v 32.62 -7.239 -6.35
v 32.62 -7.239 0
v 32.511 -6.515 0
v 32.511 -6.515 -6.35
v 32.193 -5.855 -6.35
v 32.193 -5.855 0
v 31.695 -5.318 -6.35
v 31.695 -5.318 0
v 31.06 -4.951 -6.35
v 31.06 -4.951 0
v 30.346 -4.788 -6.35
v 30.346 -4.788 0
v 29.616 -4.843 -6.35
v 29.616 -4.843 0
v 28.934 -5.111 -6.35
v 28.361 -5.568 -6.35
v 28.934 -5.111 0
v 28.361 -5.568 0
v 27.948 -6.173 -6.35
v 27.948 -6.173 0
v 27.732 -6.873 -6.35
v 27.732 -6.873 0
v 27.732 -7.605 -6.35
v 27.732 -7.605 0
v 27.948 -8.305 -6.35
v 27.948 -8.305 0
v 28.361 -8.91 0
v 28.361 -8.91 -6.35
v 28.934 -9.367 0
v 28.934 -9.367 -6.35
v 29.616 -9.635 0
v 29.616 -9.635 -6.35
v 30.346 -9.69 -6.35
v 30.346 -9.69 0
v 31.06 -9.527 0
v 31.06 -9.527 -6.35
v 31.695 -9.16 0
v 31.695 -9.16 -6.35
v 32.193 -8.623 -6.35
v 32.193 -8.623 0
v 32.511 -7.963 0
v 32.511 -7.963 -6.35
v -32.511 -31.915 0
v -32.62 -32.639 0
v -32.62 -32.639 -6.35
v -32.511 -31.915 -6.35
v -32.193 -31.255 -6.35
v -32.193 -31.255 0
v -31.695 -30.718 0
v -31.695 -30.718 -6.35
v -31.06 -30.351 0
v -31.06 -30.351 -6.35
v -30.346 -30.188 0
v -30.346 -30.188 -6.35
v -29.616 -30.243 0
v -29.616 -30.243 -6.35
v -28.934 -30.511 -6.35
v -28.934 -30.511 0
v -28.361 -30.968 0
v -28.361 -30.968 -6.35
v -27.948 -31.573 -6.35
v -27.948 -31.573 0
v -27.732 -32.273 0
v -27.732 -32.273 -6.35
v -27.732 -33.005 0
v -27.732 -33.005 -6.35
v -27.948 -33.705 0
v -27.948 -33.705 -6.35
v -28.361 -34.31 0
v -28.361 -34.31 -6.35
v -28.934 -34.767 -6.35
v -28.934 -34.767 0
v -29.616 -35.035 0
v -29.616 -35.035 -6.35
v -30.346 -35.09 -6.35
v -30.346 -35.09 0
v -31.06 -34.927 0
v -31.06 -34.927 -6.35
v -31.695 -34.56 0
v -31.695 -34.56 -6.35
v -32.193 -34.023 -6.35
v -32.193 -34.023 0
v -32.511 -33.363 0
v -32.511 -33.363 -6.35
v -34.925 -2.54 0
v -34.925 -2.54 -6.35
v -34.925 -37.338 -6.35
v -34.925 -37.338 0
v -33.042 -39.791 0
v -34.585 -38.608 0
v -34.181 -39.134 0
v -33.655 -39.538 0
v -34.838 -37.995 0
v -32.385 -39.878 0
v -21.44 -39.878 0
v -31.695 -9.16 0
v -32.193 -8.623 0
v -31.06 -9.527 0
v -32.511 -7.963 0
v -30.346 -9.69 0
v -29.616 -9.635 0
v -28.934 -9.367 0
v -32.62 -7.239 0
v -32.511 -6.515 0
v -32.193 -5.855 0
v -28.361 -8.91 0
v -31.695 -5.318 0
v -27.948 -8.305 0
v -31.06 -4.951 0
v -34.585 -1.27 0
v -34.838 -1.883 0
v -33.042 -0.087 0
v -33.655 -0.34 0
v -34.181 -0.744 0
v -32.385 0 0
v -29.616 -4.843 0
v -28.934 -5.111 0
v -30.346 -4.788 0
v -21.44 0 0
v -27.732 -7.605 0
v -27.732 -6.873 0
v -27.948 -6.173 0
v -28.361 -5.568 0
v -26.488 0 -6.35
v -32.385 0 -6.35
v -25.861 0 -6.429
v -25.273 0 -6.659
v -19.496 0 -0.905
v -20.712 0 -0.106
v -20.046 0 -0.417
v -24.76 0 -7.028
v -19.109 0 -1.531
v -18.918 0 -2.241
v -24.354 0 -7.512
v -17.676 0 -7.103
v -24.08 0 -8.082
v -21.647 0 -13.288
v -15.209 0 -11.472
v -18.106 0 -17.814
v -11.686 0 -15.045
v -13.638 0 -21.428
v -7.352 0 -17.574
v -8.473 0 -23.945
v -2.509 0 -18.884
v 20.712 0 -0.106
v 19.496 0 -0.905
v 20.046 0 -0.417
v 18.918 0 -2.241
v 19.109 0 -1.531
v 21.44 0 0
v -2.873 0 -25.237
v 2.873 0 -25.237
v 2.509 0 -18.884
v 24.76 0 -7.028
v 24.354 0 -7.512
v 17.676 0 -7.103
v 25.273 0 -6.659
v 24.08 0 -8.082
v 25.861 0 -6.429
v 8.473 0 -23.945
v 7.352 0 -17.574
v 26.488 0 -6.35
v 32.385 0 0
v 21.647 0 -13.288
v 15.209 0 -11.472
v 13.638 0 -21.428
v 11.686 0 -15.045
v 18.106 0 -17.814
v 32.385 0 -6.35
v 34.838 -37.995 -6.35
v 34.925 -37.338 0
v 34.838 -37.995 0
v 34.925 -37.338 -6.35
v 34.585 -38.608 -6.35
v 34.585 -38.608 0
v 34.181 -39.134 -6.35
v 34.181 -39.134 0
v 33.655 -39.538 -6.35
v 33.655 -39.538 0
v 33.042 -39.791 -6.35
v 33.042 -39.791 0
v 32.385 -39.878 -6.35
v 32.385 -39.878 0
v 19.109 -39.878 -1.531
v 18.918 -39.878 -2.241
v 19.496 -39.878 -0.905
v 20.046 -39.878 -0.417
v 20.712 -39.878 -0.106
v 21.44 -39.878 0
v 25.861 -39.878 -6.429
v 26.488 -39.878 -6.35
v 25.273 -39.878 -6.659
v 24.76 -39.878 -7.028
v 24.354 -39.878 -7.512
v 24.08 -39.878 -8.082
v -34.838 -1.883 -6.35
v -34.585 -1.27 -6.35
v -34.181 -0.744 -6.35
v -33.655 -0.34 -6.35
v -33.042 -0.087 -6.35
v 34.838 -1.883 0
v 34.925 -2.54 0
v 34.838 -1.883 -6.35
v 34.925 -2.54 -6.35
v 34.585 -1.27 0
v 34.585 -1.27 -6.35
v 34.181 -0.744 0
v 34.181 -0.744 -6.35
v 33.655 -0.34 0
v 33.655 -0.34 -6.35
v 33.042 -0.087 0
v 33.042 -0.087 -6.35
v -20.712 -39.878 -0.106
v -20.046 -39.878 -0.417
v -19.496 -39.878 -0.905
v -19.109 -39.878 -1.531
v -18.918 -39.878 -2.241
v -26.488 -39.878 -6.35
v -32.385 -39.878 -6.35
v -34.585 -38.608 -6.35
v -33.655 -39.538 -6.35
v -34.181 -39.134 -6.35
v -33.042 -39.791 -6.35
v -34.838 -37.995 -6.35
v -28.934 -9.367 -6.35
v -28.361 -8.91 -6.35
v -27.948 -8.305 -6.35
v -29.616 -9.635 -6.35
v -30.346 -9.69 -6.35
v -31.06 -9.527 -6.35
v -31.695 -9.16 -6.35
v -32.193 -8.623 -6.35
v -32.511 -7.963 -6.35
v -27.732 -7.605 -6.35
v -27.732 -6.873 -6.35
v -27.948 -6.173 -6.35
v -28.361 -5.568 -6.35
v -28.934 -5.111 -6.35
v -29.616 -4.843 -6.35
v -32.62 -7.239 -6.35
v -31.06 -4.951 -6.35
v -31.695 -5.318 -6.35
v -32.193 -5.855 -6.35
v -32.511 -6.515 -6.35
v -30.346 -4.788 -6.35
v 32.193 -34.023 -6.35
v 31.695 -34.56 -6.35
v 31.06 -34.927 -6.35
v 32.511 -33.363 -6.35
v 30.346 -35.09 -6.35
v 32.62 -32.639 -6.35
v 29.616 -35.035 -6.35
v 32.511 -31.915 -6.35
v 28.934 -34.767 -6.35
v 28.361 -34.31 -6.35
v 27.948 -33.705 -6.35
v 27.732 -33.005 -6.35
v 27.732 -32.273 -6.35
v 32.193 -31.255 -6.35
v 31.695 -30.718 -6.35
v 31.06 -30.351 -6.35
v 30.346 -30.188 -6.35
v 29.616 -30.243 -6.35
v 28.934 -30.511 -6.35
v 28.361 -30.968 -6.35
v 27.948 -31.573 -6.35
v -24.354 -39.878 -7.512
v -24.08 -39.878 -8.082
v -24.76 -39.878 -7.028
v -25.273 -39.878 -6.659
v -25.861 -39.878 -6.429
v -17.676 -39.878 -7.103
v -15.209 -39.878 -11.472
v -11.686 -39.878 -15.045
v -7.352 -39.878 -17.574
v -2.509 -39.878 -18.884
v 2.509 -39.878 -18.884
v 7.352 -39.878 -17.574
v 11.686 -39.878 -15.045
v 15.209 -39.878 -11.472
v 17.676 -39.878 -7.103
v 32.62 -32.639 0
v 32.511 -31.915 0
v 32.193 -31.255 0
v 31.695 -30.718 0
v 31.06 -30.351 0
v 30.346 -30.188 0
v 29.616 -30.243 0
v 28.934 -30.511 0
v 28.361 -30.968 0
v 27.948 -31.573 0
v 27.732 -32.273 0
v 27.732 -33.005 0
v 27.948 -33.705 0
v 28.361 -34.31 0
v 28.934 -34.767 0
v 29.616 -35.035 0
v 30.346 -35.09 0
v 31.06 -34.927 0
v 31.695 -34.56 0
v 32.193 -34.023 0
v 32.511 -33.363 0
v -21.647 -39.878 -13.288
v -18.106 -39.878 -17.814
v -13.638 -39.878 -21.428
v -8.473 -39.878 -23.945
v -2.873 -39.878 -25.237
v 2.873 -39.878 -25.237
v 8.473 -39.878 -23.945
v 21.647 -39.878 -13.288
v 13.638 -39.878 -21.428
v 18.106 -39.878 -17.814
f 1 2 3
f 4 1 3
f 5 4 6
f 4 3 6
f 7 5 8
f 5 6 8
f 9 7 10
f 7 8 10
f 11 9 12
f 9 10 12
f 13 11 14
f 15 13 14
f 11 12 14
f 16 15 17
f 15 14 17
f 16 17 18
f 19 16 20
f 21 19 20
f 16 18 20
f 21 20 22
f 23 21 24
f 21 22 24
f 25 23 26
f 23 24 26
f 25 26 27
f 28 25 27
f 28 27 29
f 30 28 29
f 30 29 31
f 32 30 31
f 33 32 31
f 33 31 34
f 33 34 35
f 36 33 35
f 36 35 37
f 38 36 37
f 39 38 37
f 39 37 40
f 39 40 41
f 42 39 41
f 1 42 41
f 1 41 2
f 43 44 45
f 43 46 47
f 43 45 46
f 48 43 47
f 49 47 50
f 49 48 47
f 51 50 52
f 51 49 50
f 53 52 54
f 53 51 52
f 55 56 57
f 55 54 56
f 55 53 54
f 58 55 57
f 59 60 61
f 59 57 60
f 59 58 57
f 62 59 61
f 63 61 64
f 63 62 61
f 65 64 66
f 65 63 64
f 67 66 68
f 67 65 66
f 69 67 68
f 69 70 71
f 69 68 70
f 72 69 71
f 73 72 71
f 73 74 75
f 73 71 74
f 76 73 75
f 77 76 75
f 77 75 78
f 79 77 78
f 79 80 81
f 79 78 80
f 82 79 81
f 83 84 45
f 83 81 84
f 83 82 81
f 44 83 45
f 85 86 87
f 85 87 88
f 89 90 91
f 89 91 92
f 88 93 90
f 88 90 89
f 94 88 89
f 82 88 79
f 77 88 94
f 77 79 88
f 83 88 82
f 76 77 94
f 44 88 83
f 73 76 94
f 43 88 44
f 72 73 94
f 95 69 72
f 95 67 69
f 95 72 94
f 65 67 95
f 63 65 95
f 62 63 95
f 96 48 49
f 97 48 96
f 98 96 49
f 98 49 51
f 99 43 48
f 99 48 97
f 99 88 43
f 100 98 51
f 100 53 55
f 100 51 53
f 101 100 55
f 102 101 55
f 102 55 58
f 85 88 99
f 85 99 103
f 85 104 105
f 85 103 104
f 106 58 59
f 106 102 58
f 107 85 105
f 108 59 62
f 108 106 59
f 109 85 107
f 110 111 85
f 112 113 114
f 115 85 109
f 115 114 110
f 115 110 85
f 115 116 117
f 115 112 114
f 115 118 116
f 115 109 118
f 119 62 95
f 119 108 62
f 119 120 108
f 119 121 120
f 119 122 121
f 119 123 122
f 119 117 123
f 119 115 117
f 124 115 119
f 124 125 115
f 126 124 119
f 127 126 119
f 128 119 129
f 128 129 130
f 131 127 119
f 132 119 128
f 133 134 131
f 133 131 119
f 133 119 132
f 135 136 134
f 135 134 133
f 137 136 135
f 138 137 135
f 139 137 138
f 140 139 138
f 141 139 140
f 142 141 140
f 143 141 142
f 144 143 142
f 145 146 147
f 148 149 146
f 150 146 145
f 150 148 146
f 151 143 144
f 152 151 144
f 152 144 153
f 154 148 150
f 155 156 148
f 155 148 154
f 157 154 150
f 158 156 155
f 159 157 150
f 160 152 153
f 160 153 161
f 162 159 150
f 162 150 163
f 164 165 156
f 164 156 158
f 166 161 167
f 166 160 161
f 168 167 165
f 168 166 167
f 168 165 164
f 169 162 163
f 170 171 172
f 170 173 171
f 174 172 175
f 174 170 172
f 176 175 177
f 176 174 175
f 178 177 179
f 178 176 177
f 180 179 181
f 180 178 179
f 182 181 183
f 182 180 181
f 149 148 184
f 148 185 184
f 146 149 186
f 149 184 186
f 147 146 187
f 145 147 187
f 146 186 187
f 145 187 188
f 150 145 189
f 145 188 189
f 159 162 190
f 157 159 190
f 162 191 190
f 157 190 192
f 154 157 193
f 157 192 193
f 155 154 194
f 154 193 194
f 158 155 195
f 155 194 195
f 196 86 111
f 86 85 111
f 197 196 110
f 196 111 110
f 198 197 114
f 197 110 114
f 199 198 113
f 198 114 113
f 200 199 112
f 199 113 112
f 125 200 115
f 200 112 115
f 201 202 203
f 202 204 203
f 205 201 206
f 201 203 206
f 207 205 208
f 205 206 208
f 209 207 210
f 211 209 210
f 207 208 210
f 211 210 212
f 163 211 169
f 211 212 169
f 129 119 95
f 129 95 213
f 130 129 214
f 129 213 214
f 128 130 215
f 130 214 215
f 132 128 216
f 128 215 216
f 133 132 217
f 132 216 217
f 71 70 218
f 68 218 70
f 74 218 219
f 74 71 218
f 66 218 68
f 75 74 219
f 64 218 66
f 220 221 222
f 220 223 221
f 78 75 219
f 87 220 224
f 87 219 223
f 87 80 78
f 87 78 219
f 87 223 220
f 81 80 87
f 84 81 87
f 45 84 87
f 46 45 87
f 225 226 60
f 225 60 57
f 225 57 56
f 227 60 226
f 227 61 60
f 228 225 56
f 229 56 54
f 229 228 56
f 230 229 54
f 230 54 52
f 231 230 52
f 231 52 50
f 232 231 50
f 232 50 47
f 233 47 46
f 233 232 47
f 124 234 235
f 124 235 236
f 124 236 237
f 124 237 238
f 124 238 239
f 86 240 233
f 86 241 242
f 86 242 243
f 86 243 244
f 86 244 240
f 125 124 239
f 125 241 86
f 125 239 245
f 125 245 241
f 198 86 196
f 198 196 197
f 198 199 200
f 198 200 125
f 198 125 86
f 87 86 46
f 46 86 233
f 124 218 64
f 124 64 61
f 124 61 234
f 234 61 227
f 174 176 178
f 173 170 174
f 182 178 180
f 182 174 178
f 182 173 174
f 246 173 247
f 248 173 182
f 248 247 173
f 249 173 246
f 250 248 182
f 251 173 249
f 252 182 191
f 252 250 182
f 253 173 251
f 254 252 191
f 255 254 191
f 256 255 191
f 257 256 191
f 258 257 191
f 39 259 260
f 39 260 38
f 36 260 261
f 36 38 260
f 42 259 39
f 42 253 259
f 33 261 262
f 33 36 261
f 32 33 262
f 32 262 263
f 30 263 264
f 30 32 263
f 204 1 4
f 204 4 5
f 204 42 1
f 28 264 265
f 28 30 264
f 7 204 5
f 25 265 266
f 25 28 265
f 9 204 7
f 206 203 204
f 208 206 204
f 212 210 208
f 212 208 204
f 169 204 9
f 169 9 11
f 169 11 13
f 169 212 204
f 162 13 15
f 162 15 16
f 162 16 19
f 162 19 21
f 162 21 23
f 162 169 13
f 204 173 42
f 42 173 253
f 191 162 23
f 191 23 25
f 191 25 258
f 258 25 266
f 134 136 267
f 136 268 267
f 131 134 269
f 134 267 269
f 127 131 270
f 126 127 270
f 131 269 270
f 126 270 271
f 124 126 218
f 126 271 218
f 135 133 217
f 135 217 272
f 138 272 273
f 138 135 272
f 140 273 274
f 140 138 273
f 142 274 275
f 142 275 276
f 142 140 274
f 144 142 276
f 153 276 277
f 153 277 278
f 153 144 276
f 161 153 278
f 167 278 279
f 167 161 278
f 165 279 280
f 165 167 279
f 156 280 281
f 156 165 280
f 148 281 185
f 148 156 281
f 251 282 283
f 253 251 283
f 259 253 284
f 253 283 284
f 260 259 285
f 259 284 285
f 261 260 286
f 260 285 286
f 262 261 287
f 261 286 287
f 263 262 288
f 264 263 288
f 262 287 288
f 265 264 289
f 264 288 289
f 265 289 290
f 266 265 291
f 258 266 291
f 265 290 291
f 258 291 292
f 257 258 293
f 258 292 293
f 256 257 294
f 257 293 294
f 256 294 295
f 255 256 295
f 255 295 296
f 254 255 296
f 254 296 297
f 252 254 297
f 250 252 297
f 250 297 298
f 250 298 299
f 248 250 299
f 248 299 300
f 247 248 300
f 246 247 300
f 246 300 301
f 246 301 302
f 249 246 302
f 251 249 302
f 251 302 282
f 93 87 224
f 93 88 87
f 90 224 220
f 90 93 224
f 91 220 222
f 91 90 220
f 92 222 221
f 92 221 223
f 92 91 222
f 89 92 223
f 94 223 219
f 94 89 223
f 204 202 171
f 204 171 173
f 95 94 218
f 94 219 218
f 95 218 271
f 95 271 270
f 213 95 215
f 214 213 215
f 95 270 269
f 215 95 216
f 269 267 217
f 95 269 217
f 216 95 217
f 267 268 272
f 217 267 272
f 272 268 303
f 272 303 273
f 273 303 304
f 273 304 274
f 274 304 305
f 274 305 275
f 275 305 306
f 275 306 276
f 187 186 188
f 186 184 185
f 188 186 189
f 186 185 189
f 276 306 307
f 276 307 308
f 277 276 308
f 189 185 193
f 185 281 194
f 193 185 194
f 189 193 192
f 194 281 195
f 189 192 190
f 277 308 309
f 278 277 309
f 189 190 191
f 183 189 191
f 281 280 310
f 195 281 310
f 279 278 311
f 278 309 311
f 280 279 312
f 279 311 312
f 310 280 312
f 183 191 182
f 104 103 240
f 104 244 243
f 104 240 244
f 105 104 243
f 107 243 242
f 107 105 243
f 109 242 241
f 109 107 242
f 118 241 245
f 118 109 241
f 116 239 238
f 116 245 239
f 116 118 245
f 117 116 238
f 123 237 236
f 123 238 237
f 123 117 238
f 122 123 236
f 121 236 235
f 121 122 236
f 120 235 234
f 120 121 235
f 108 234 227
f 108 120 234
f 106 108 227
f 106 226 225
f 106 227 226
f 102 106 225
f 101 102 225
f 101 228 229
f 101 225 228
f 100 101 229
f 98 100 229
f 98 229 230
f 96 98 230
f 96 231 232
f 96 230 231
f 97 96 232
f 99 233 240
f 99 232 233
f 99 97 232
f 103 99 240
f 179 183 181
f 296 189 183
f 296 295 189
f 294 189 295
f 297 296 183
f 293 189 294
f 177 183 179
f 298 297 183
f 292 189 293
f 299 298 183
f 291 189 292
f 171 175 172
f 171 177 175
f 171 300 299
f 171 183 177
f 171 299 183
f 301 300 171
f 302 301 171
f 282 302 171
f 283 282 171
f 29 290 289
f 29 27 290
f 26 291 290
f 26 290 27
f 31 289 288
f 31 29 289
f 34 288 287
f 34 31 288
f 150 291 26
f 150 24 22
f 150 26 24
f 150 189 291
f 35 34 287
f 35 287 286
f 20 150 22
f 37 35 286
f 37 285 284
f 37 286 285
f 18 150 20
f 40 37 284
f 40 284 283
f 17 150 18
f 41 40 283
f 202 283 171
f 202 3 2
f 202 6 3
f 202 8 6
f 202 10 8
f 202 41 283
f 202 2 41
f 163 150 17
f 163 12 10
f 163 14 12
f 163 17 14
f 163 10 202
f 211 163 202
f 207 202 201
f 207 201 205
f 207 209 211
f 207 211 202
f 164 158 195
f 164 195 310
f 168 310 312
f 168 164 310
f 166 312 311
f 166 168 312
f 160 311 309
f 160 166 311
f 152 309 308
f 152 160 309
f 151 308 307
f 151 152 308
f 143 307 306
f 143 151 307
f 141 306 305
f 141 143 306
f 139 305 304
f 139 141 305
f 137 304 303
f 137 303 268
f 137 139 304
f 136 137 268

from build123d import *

# Parameters (mm, degrees)
BOSS_EXTRUDE2_DEPTH          = 39.878
FILLET1_R                    = 2.54
F_10_0_1935_DIAMETER_HOLE1_D = 4.9149


with BuildPart() as part:
    # Sketch5 → Boss-Extrude2 (new body)
    with BuildSketch(Plane(origin=(0, 0, 0), x_dir=(1, 0, 0), z_dir=(0, 1, 0))):
        with BuildLine():
            Line((-34.925, 0), (-19.05, 0))
            ThreePointArc((-19.05, 0), (0, 19.05), (19.05, 0))
            Line((19.05, 0), (34.925, 0))
            Line((34.925, 0), (34.925, 6.35))
            Line((34.925, 6.35), (24.593444248, 6.35))
            ThreePointArc((24.593444248, 6.35), (0, 25.4), (-24.593444248, 6.35))
            Line((-24.593444248, 6.35), (-34.925, 6.35))
            Line((-34.925, 6.35), (-34.925, 0))
        make_face()
    extrude(amount=-BOSS_EXTRUDE2_DEPTH)

    # Fillet1
    fillet1_edges = [part.edges().sort_by_distance(p)[0] for p in [
        (-34.925, 0, -3.175),
        (-24.593444248, -19.939, -6.35),
        (24.593444248, -19.939, -6.35),
        (19.05, -19.939, 0),
        (-19.05, -19.939, 0),
        (34.925, -39.878, -3.175),
        (-34.925, -39.878, -3.175),
        (34.925, 0, -3.175),
    ]]
    fillet(fillet1_edges, radius=FILLET1_R)

    # #10 (0.1935) Diameter Hole1 (through all)
    with Locations(Plane(origin=(0, 0, -6.35), x_dir=(-1, 0, 0), z_dir=(0, 0, -1))):
        with Locations((-30.1625, -7.239), (-30.1625, -32.639)):
            f_10_0_1935_diameter_hole1 = Hole(F_10_0_1935_DIAMETER_HOLE1_D / 2)

    # Mirror1: #10 (0.1935) Diameter Hole1 across plane
    add(f_10_0_1935_diameter_hole1.mirror(Plane(origin=(0, 0, 0), x_dir=(0, 0, 1), z_dir=(1, 0, 0))), mode=Mode.SUBTRACT)


solid = part.part
